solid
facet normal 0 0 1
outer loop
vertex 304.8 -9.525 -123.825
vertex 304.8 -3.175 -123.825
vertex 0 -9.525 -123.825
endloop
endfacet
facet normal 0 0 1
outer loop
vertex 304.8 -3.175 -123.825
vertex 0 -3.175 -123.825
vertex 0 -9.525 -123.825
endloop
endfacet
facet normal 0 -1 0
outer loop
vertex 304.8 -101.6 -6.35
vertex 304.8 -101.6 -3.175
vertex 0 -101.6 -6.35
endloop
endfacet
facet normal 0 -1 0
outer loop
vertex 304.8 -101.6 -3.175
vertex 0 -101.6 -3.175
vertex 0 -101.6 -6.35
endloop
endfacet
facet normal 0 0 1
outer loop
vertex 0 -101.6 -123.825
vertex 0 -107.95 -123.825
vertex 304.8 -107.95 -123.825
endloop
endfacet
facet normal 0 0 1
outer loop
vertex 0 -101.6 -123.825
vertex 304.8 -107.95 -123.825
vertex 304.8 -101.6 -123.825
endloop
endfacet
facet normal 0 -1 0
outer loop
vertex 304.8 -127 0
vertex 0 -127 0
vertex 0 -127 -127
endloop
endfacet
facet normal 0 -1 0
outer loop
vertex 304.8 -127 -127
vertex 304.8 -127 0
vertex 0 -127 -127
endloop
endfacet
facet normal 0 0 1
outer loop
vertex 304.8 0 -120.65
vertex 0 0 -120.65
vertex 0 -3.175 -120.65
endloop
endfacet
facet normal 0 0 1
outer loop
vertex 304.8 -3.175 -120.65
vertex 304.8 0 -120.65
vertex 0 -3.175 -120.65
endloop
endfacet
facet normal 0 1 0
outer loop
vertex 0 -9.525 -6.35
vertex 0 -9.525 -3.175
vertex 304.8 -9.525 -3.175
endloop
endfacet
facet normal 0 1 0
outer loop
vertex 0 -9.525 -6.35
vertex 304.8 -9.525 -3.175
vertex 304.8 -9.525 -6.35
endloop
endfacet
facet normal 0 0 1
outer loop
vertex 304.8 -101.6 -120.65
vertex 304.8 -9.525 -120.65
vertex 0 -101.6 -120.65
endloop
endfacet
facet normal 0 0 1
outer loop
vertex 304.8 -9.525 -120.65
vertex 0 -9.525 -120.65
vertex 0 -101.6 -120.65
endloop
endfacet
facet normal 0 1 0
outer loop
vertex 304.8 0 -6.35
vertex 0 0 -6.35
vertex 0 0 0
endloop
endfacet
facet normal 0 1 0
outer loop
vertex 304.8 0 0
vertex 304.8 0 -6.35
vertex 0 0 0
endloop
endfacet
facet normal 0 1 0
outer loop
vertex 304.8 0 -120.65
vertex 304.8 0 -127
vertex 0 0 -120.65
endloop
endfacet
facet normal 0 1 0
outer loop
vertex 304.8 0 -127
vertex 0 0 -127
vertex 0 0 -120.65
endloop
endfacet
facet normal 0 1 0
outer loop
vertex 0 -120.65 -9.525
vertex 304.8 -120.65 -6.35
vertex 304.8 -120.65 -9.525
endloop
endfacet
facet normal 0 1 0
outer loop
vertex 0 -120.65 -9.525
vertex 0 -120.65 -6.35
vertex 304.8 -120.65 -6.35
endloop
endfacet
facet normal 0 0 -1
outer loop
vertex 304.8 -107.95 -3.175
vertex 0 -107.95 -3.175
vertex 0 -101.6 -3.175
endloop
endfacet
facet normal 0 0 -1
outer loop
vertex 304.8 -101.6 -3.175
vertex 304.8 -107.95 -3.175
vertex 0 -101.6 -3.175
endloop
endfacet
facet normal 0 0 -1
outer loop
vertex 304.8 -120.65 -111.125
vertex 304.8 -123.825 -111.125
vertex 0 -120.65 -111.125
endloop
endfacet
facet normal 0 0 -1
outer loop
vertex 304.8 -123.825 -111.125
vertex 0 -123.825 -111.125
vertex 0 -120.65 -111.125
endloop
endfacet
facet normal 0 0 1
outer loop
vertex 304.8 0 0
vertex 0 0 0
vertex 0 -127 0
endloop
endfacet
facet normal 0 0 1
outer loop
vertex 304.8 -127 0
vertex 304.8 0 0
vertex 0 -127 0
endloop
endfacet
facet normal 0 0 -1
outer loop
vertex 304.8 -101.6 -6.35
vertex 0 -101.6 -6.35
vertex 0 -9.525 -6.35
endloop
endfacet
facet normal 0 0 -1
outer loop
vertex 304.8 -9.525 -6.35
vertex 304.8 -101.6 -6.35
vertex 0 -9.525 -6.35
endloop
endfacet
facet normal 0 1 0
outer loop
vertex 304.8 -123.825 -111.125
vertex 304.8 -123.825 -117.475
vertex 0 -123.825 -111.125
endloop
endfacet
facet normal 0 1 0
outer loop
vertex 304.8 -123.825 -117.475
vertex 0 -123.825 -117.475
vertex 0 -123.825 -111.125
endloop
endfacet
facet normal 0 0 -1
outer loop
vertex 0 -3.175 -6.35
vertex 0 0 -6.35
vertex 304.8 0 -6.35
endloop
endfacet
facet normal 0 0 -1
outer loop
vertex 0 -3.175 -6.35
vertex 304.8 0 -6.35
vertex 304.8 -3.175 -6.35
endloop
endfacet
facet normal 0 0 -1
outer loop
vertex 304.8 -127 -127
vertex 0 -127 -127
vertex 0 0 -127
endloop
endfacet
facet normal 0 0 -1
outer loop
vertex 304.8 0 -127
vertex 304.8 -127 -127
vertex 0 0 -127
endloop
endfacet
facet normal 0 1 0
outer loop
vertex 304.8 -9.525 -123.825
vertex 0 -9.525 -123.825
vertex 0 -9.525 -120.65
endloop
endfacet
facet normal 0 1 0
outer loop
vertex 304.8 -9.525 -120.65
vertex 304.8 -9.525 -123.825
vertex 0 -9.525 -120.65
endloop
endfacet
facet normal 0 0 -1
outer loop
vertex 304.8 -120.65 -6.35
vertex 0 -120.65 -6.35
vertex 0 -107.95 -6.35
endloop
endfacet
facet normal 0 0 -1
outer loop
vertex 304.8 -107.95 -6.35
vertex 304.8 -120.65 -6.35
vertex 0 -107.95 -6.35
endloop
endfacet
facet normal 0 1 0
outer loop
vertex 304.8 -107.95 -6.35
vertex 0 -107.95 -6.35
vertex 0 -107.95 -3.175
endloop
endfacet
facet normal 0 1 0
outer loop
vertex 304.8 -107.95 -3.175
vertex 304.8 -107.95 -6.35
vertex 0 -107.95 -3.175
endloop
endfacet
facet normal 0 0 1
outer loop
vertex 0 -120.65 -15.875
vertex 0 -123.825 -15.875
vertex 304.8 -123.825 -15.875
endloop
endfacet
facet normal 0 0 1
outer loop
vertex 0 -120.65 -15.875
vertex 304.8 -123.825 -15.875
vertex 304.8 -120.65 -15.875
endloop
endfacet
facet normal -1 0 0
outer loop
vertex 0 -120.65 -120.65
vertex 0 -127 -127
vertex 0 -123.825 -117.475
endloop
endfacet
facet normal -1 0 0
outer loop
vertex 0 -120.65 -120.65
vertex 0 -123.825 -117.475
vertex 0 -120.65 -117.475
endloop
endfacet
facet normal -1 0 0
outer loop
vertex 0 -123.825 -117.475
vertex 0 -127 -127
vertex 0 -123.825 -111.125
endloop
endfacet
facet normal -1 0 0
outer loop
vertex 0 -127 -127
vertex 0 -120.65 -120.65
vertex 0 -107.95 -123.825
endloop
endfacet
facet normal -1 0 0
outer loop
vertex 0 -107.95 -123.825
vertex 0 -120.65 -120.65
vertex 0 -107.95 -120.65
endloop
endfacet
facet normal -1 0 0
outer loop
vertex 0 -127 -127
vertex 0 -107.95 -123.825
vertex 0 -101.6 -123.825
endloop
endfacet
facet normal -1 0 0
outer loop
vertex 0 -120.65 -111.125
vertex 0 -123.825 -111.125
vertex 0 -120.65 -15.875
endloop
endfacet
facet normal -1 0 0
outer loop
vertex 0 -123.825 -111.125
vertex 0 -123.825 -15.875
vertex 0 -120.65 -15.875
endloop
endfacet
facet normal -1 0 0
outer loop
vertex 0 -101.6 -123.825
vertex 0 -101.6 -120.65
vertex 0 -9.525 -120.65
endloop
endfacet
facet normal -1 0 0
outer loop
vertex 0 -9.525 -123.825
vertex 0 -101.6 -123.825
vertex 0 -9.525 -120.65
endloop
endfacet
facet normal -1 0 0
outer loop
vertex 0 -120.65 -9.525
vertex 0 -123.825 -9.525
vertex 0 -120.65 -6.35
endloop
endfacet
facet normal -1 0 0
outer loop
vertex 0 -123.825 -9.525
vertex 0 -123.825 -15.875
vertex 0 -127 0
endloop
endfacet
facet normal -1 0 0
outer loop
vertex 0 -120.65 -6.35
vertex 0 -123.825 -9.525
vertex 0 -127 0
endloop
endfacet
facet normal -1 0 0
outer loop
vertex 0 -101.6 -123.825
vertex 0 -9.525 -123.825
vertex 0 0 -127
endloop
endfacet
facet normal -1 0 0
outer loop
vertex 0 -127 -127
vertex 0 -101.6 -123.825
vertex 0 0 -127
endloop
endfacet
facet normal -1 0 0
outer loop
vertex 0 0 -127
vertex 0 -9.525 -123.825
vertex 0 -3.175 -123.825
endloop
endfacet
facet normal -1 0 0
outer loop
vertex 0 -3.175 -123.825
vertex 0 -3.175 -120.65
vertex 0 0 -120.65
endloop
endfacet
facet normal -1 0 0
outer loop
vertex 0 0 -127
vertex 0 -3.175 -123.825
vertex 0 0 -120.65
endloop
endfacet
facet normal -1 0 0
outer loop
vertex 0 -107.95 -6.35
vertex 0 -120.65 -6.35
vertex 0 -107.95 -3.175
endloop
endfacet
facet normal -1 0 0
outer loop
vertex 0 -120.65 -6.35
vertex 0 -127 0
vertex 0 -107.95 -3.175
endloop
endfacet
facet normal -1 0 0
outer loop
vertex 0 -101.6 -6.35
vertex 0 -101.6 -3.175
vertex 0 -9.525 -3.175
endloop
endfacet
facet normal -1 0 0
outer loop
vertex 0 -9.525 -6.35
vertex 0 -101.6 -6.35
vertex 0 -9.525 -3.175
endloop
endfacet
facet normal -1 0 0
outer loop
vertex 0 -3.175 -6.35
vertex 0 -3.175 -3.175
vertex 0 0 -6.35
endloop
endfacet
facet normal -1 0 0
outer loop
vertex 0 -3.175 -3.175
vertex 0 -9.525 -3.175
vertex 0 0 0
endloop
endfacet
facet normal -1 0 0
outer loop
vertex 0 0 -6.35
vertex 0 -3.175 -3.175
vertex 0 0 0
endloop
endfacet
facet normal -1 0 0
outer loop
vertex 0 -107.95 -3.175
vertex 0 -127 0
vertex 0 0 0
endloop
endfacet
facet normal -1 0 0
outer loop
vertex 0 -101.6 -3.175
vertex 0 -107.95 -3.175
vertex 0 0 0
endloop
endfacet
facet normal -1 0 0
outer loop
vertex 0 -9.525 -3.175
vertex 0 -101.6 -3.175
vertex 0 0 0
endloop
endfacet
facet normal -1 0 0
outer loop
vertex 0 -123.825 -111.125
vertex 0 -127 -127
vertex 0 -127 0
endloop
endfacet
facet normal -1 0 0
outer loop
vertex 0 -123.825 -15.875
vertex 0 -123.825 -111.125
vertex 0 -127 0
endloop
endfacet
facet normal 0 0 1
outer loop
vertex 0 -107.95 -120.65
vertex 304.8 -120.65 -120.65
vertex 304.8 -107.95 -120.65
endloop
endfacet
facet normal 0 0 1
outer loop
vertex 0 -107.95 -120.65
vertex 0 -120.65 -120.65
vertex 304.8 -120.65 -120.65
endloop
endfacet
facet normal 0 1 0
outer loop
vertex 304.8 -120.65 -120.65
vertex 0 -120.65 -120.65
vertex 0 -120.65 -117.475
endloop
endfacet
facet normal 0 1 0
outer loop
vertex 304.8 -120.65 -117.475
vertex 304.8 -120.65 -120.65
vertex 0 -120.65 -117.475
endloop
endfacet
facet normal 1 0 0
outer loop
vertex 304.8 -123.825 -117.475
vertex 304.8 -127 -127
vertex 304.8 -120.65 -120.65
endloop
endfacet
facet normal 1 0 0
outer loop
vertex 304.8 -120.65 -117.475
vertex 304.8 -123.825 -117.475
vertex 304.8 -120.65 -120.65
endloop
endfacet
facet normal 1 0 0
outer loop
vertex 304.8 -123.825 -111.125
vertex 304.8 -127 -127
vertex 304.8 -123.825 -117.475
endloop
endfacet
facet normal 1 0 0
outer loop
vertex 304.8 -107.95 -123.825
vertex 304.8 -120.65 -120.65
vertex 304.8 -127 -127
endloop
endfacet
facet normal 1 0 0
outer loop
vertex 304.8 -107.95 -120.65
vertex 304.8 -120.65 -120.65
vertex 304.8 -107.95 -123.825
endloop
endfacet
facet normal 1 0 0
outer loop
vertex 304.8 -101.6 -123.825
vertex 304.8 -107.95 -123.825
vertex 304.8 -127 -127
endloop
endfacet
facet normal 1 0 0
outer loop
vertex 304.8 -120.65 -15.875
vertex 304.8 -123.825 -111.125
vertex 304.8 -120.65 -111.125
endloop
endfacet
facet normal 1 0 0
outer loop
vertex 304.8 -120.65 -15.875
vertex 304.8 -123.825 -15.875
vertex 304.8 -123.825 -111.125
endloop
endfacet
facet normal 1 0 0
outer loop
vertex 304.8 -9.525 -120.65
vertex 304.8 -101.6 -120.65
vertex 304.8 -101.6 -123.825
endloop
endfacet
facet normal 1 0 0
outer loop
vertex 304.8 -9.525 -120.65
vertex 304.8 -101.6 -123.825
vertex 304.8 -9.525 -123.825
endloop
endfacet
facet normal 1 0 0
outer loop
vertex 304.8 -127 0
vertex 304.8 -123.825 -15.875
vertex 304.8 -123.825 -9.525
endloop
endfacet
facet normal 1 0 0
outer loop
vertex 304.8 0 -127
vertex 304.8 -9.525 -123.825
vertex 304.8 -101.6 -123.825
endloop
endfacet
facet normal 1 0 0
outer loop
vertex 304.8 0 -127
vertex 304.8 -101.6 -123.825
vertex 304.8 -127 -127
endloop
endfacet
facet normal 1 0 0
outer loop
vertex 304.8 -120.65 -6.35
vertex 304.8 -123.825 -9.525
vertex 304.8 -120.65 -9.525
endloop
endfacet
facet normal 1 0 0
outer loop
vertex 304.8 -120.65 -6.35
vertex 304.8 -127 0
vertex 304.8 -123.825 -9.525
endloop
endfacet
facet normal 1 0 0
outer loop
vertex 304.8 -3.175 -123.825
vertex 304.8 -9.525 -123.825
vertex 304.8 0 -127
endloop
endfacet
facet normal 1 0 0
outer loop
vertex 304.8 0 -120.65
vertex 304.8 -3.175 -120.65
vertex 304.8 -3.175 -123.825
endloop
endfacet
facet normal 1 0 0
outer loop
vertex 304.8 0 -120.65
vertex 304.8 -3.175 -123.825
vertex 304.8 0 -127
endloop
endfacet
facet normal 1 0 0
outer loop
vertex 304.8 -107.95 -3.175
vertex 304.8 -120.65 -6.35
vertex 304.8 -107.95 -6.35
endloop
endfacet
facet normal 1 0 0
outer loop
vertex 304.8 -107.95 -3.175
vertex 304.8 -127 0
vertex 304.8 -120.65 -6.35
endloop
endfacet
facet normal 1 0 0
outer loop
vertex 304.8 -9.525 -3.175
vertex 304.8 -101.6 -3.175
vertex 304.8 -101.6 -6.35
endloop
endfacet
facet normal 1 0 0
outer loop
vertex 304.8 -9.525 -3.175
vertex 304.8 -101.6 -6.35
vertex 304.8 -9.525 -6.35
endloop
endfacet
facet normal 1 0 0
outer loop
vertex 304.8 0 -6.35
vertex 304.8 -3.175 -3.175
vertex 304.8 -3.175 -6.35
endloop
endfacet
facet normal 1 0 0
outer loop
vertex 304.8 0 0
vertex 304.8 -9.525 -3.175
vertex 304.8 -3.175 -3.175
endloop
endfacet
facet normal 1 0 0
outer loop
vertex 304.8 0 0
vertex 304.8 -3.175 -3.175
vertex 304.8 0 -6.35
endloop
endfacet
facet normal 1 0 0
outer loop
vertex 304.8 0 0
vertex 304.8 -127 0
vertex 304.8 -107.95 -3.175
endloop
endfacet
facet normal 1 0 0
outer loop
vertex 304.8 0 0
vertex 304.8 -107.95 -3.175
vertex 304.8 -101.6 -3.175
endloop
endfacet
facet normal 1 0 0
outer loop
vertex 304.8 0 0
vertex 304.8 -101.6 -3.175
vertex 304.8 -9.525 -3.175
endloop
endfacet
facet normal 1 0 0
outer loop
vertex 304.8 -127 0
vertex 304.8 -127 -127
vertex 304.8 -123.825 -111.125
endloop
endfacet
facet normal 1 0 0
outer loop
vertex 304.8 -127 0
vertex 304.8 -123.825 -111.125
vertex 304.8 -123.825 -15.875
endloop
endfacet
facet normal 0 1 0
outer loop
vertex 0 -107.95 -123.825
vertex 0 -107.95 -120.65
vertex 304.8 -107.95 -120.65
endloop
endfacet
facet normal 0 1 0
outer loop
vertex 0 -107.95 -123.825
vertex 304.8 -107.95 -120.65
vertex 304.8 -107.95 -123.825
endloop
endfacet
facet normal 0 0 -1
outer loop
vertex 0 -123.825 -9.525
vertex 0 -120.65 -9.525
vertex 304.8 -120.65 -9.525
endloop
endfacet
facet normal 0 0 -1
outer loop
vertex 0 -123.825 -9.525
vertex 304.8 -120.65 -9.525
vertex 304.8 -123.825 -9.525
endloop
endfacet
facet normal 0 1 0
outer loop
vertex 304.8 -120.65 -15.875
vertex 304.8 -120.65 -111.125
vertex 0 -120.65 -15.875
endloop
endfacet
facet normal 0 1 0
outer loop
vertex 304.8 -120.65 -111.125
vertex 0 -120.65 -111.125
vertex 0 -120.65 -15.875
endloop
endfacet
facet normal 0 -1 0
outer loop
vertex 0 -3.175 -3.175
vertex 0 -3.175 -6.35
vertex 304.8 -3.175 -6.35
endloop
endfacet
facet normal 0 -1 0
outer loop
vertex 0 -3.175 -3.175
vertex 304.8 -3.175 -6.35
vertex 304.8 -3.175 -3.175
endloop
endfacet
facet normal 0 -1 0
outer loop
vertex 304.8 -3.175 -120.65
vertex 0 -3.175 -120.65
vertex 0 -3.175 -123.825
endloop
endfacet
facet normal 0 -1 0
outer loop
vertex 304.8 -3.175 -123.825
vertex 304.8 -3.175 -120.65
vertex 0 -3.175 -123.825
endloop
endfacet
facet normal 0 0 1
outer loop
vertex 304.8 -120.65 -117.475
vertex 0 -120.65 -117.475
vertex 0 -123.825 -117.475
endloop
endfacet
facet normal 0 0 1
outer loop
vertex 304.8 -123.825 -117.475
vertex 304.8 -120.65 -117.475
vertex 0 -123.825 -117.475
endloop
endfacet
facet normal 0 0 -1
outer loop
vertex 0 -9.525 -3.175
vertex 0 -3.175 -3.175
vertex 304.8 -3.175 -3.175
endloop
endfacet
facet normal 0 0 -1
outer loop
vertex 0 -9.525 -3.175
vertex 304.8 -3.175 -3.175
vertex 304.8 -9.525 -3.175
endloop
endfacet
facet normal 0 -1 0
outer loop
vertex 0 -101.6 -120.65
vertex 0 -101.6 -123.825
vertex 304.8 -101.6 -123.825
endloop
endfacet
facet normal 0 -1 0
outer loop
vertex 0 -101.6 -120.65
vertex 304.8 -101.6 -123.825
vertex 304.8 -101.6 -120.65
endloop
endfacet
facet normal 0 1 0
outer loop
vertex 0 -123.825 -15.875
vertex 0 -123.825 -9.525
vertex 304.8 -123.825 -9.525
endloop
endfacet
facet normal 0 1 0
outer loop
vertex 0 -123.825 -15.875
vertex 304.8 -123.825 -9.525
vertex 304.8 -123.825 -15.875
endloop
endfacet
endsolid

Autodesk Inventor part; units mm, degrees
ref_plane "YZ Plane" through (0, 0, 0) normal (1, 0, 0) x (0, 1, 0)
ref_plane "XZ Plane" through (0, 0, 0) normal (0, 1, 0) x (-1, 0, 0)
ref_plane "XY Plane" through (0, 0, 0) normal (0, 0, 1) x (1, 0, 0)
sketch "Sketch1" plane through (0, 0, 0) normal (1, 0, 0) x (0, 1, 0)
  line L0 (0, 0) -> (-127, 0)
  line L1 (-127, 0) -> (-127, -127)
  line L2 (-127, -127) -> (0, -127)
  line L3 (0, -127) -> (0, -120.65)
  line L4 (0, -6.35) -> (0, 0)
  line L5 (0, -6.35) -> (-3.175, -6.35)
  line L6 (-3.175, -6.35) -> (-3.175, -3.175)
  line L7 (-3.175, -3.175) -> (-9.525, -3.175)
  line L8 (-9.525, -3.175) -> (-9.525, -6.35)
  line L9 (-3.175, -6.35) -> (0, -6.35)
  line L10 (0, -120.65) -> (-3.175, -120.65)
  line L11 (-3.175, -120.65) -> (-3.175, -123.825)
  line L12 (-3.175, -123.825) -> (-9.525, -123.825)
  line L13 (-9.525, -123.825) -> (-9.525, -120.65)
  line L14 (0, -120.65) -> (-3.175, -120.65)
  line L15 (-120.65, -6.35) -> (-120.65, -9.525)
  line L16 (-120.65, -9.525) -> (-123.825, -9.525)
  line L17 (-123.825, -9.525) -> (-123.825, -15.875)
  line L18 (-123.825, -15.875) -> (-120.65, -15.875)
  line L19 (-120.65, -9.525) -> (-120.65, -6.35)
  line L20 (-120.65, -120.65) -> (-120.65, -117.475)
  line L21 (-120.65, -117.475) -> (-123.825, -117.475)
  line L22 (-123.825, -117.475) -> (-123.825, -111.125)
  line L23 (-123.825, -111.125) -> (-120.65, -111.125)
  line L24 (-120.65, -120.65) -> (-120.65, -117.475)
  line L25 (-120.65, -111.125) -> (-120.65, -15.875)
  line L26 (-120.65, -6.35) -> (-107.95, -6.35)
  line L27 (-107.95, -6.35) -> (-107.95, -3.175)
  line L28 (-107.95, -3.175) -> (-101.6, -3.175)
  line L29 (-101.6, -3.175) -> (-101.6, -6.35)
  line L30 (-120.65, -6.35) -> (-107.95, -6.35)
  line L31 (-101.6, -6.35) -> (-9.525, -6.35)
  line L32 (-120.65, -120.65) -> (-107.95, -120.65)
  line L33 (-107.95, -120.65) -> (-107.95, -123.825)
  line L34 (-107.95, -123.825) -> (-101.6, -123.825)
  line L35 (-101.6, -123.825) -> (-101.6, -120.65)
  line L36 (-9.525, -120.65) -> (-101.6, -120.65)
  line L37 (-107.95, -120.65) -> (-120.65, -120.65)
  dimension "d0" = 127
  dimension "d1" = 127
  dimension "d2" = 6.35
  dimension "d3" = 120.65
  dimension "d4" = 114.3
  dimension "d5" = 3.175
  dimension "d9" = 3.175
  dimension "d10" = 3.175
  dimension "d11" = 3.175
  dimension "d12" = 6.35
  dimension "d13" = 3.175
  dimension "d14" = 3.175
  dimension "d15" = 6.35
  dimension "d16" = 3.175
  dimension "d17" = 3.175
  dimension "d18" = 6.35
  dimension "d21" = 12.7
  dimension "d22" = 3.175
  dimension "d23" = 6.35
  dimension "d24" = 12.7
  dimension "d25" = 3.175
  dimension "d26" = 6.35
extrude "Extrusion1" add sketch "Sketch1" along normal blind 304.8
properties part number "CompactSlidePart1" material "Aluminum 6061"
